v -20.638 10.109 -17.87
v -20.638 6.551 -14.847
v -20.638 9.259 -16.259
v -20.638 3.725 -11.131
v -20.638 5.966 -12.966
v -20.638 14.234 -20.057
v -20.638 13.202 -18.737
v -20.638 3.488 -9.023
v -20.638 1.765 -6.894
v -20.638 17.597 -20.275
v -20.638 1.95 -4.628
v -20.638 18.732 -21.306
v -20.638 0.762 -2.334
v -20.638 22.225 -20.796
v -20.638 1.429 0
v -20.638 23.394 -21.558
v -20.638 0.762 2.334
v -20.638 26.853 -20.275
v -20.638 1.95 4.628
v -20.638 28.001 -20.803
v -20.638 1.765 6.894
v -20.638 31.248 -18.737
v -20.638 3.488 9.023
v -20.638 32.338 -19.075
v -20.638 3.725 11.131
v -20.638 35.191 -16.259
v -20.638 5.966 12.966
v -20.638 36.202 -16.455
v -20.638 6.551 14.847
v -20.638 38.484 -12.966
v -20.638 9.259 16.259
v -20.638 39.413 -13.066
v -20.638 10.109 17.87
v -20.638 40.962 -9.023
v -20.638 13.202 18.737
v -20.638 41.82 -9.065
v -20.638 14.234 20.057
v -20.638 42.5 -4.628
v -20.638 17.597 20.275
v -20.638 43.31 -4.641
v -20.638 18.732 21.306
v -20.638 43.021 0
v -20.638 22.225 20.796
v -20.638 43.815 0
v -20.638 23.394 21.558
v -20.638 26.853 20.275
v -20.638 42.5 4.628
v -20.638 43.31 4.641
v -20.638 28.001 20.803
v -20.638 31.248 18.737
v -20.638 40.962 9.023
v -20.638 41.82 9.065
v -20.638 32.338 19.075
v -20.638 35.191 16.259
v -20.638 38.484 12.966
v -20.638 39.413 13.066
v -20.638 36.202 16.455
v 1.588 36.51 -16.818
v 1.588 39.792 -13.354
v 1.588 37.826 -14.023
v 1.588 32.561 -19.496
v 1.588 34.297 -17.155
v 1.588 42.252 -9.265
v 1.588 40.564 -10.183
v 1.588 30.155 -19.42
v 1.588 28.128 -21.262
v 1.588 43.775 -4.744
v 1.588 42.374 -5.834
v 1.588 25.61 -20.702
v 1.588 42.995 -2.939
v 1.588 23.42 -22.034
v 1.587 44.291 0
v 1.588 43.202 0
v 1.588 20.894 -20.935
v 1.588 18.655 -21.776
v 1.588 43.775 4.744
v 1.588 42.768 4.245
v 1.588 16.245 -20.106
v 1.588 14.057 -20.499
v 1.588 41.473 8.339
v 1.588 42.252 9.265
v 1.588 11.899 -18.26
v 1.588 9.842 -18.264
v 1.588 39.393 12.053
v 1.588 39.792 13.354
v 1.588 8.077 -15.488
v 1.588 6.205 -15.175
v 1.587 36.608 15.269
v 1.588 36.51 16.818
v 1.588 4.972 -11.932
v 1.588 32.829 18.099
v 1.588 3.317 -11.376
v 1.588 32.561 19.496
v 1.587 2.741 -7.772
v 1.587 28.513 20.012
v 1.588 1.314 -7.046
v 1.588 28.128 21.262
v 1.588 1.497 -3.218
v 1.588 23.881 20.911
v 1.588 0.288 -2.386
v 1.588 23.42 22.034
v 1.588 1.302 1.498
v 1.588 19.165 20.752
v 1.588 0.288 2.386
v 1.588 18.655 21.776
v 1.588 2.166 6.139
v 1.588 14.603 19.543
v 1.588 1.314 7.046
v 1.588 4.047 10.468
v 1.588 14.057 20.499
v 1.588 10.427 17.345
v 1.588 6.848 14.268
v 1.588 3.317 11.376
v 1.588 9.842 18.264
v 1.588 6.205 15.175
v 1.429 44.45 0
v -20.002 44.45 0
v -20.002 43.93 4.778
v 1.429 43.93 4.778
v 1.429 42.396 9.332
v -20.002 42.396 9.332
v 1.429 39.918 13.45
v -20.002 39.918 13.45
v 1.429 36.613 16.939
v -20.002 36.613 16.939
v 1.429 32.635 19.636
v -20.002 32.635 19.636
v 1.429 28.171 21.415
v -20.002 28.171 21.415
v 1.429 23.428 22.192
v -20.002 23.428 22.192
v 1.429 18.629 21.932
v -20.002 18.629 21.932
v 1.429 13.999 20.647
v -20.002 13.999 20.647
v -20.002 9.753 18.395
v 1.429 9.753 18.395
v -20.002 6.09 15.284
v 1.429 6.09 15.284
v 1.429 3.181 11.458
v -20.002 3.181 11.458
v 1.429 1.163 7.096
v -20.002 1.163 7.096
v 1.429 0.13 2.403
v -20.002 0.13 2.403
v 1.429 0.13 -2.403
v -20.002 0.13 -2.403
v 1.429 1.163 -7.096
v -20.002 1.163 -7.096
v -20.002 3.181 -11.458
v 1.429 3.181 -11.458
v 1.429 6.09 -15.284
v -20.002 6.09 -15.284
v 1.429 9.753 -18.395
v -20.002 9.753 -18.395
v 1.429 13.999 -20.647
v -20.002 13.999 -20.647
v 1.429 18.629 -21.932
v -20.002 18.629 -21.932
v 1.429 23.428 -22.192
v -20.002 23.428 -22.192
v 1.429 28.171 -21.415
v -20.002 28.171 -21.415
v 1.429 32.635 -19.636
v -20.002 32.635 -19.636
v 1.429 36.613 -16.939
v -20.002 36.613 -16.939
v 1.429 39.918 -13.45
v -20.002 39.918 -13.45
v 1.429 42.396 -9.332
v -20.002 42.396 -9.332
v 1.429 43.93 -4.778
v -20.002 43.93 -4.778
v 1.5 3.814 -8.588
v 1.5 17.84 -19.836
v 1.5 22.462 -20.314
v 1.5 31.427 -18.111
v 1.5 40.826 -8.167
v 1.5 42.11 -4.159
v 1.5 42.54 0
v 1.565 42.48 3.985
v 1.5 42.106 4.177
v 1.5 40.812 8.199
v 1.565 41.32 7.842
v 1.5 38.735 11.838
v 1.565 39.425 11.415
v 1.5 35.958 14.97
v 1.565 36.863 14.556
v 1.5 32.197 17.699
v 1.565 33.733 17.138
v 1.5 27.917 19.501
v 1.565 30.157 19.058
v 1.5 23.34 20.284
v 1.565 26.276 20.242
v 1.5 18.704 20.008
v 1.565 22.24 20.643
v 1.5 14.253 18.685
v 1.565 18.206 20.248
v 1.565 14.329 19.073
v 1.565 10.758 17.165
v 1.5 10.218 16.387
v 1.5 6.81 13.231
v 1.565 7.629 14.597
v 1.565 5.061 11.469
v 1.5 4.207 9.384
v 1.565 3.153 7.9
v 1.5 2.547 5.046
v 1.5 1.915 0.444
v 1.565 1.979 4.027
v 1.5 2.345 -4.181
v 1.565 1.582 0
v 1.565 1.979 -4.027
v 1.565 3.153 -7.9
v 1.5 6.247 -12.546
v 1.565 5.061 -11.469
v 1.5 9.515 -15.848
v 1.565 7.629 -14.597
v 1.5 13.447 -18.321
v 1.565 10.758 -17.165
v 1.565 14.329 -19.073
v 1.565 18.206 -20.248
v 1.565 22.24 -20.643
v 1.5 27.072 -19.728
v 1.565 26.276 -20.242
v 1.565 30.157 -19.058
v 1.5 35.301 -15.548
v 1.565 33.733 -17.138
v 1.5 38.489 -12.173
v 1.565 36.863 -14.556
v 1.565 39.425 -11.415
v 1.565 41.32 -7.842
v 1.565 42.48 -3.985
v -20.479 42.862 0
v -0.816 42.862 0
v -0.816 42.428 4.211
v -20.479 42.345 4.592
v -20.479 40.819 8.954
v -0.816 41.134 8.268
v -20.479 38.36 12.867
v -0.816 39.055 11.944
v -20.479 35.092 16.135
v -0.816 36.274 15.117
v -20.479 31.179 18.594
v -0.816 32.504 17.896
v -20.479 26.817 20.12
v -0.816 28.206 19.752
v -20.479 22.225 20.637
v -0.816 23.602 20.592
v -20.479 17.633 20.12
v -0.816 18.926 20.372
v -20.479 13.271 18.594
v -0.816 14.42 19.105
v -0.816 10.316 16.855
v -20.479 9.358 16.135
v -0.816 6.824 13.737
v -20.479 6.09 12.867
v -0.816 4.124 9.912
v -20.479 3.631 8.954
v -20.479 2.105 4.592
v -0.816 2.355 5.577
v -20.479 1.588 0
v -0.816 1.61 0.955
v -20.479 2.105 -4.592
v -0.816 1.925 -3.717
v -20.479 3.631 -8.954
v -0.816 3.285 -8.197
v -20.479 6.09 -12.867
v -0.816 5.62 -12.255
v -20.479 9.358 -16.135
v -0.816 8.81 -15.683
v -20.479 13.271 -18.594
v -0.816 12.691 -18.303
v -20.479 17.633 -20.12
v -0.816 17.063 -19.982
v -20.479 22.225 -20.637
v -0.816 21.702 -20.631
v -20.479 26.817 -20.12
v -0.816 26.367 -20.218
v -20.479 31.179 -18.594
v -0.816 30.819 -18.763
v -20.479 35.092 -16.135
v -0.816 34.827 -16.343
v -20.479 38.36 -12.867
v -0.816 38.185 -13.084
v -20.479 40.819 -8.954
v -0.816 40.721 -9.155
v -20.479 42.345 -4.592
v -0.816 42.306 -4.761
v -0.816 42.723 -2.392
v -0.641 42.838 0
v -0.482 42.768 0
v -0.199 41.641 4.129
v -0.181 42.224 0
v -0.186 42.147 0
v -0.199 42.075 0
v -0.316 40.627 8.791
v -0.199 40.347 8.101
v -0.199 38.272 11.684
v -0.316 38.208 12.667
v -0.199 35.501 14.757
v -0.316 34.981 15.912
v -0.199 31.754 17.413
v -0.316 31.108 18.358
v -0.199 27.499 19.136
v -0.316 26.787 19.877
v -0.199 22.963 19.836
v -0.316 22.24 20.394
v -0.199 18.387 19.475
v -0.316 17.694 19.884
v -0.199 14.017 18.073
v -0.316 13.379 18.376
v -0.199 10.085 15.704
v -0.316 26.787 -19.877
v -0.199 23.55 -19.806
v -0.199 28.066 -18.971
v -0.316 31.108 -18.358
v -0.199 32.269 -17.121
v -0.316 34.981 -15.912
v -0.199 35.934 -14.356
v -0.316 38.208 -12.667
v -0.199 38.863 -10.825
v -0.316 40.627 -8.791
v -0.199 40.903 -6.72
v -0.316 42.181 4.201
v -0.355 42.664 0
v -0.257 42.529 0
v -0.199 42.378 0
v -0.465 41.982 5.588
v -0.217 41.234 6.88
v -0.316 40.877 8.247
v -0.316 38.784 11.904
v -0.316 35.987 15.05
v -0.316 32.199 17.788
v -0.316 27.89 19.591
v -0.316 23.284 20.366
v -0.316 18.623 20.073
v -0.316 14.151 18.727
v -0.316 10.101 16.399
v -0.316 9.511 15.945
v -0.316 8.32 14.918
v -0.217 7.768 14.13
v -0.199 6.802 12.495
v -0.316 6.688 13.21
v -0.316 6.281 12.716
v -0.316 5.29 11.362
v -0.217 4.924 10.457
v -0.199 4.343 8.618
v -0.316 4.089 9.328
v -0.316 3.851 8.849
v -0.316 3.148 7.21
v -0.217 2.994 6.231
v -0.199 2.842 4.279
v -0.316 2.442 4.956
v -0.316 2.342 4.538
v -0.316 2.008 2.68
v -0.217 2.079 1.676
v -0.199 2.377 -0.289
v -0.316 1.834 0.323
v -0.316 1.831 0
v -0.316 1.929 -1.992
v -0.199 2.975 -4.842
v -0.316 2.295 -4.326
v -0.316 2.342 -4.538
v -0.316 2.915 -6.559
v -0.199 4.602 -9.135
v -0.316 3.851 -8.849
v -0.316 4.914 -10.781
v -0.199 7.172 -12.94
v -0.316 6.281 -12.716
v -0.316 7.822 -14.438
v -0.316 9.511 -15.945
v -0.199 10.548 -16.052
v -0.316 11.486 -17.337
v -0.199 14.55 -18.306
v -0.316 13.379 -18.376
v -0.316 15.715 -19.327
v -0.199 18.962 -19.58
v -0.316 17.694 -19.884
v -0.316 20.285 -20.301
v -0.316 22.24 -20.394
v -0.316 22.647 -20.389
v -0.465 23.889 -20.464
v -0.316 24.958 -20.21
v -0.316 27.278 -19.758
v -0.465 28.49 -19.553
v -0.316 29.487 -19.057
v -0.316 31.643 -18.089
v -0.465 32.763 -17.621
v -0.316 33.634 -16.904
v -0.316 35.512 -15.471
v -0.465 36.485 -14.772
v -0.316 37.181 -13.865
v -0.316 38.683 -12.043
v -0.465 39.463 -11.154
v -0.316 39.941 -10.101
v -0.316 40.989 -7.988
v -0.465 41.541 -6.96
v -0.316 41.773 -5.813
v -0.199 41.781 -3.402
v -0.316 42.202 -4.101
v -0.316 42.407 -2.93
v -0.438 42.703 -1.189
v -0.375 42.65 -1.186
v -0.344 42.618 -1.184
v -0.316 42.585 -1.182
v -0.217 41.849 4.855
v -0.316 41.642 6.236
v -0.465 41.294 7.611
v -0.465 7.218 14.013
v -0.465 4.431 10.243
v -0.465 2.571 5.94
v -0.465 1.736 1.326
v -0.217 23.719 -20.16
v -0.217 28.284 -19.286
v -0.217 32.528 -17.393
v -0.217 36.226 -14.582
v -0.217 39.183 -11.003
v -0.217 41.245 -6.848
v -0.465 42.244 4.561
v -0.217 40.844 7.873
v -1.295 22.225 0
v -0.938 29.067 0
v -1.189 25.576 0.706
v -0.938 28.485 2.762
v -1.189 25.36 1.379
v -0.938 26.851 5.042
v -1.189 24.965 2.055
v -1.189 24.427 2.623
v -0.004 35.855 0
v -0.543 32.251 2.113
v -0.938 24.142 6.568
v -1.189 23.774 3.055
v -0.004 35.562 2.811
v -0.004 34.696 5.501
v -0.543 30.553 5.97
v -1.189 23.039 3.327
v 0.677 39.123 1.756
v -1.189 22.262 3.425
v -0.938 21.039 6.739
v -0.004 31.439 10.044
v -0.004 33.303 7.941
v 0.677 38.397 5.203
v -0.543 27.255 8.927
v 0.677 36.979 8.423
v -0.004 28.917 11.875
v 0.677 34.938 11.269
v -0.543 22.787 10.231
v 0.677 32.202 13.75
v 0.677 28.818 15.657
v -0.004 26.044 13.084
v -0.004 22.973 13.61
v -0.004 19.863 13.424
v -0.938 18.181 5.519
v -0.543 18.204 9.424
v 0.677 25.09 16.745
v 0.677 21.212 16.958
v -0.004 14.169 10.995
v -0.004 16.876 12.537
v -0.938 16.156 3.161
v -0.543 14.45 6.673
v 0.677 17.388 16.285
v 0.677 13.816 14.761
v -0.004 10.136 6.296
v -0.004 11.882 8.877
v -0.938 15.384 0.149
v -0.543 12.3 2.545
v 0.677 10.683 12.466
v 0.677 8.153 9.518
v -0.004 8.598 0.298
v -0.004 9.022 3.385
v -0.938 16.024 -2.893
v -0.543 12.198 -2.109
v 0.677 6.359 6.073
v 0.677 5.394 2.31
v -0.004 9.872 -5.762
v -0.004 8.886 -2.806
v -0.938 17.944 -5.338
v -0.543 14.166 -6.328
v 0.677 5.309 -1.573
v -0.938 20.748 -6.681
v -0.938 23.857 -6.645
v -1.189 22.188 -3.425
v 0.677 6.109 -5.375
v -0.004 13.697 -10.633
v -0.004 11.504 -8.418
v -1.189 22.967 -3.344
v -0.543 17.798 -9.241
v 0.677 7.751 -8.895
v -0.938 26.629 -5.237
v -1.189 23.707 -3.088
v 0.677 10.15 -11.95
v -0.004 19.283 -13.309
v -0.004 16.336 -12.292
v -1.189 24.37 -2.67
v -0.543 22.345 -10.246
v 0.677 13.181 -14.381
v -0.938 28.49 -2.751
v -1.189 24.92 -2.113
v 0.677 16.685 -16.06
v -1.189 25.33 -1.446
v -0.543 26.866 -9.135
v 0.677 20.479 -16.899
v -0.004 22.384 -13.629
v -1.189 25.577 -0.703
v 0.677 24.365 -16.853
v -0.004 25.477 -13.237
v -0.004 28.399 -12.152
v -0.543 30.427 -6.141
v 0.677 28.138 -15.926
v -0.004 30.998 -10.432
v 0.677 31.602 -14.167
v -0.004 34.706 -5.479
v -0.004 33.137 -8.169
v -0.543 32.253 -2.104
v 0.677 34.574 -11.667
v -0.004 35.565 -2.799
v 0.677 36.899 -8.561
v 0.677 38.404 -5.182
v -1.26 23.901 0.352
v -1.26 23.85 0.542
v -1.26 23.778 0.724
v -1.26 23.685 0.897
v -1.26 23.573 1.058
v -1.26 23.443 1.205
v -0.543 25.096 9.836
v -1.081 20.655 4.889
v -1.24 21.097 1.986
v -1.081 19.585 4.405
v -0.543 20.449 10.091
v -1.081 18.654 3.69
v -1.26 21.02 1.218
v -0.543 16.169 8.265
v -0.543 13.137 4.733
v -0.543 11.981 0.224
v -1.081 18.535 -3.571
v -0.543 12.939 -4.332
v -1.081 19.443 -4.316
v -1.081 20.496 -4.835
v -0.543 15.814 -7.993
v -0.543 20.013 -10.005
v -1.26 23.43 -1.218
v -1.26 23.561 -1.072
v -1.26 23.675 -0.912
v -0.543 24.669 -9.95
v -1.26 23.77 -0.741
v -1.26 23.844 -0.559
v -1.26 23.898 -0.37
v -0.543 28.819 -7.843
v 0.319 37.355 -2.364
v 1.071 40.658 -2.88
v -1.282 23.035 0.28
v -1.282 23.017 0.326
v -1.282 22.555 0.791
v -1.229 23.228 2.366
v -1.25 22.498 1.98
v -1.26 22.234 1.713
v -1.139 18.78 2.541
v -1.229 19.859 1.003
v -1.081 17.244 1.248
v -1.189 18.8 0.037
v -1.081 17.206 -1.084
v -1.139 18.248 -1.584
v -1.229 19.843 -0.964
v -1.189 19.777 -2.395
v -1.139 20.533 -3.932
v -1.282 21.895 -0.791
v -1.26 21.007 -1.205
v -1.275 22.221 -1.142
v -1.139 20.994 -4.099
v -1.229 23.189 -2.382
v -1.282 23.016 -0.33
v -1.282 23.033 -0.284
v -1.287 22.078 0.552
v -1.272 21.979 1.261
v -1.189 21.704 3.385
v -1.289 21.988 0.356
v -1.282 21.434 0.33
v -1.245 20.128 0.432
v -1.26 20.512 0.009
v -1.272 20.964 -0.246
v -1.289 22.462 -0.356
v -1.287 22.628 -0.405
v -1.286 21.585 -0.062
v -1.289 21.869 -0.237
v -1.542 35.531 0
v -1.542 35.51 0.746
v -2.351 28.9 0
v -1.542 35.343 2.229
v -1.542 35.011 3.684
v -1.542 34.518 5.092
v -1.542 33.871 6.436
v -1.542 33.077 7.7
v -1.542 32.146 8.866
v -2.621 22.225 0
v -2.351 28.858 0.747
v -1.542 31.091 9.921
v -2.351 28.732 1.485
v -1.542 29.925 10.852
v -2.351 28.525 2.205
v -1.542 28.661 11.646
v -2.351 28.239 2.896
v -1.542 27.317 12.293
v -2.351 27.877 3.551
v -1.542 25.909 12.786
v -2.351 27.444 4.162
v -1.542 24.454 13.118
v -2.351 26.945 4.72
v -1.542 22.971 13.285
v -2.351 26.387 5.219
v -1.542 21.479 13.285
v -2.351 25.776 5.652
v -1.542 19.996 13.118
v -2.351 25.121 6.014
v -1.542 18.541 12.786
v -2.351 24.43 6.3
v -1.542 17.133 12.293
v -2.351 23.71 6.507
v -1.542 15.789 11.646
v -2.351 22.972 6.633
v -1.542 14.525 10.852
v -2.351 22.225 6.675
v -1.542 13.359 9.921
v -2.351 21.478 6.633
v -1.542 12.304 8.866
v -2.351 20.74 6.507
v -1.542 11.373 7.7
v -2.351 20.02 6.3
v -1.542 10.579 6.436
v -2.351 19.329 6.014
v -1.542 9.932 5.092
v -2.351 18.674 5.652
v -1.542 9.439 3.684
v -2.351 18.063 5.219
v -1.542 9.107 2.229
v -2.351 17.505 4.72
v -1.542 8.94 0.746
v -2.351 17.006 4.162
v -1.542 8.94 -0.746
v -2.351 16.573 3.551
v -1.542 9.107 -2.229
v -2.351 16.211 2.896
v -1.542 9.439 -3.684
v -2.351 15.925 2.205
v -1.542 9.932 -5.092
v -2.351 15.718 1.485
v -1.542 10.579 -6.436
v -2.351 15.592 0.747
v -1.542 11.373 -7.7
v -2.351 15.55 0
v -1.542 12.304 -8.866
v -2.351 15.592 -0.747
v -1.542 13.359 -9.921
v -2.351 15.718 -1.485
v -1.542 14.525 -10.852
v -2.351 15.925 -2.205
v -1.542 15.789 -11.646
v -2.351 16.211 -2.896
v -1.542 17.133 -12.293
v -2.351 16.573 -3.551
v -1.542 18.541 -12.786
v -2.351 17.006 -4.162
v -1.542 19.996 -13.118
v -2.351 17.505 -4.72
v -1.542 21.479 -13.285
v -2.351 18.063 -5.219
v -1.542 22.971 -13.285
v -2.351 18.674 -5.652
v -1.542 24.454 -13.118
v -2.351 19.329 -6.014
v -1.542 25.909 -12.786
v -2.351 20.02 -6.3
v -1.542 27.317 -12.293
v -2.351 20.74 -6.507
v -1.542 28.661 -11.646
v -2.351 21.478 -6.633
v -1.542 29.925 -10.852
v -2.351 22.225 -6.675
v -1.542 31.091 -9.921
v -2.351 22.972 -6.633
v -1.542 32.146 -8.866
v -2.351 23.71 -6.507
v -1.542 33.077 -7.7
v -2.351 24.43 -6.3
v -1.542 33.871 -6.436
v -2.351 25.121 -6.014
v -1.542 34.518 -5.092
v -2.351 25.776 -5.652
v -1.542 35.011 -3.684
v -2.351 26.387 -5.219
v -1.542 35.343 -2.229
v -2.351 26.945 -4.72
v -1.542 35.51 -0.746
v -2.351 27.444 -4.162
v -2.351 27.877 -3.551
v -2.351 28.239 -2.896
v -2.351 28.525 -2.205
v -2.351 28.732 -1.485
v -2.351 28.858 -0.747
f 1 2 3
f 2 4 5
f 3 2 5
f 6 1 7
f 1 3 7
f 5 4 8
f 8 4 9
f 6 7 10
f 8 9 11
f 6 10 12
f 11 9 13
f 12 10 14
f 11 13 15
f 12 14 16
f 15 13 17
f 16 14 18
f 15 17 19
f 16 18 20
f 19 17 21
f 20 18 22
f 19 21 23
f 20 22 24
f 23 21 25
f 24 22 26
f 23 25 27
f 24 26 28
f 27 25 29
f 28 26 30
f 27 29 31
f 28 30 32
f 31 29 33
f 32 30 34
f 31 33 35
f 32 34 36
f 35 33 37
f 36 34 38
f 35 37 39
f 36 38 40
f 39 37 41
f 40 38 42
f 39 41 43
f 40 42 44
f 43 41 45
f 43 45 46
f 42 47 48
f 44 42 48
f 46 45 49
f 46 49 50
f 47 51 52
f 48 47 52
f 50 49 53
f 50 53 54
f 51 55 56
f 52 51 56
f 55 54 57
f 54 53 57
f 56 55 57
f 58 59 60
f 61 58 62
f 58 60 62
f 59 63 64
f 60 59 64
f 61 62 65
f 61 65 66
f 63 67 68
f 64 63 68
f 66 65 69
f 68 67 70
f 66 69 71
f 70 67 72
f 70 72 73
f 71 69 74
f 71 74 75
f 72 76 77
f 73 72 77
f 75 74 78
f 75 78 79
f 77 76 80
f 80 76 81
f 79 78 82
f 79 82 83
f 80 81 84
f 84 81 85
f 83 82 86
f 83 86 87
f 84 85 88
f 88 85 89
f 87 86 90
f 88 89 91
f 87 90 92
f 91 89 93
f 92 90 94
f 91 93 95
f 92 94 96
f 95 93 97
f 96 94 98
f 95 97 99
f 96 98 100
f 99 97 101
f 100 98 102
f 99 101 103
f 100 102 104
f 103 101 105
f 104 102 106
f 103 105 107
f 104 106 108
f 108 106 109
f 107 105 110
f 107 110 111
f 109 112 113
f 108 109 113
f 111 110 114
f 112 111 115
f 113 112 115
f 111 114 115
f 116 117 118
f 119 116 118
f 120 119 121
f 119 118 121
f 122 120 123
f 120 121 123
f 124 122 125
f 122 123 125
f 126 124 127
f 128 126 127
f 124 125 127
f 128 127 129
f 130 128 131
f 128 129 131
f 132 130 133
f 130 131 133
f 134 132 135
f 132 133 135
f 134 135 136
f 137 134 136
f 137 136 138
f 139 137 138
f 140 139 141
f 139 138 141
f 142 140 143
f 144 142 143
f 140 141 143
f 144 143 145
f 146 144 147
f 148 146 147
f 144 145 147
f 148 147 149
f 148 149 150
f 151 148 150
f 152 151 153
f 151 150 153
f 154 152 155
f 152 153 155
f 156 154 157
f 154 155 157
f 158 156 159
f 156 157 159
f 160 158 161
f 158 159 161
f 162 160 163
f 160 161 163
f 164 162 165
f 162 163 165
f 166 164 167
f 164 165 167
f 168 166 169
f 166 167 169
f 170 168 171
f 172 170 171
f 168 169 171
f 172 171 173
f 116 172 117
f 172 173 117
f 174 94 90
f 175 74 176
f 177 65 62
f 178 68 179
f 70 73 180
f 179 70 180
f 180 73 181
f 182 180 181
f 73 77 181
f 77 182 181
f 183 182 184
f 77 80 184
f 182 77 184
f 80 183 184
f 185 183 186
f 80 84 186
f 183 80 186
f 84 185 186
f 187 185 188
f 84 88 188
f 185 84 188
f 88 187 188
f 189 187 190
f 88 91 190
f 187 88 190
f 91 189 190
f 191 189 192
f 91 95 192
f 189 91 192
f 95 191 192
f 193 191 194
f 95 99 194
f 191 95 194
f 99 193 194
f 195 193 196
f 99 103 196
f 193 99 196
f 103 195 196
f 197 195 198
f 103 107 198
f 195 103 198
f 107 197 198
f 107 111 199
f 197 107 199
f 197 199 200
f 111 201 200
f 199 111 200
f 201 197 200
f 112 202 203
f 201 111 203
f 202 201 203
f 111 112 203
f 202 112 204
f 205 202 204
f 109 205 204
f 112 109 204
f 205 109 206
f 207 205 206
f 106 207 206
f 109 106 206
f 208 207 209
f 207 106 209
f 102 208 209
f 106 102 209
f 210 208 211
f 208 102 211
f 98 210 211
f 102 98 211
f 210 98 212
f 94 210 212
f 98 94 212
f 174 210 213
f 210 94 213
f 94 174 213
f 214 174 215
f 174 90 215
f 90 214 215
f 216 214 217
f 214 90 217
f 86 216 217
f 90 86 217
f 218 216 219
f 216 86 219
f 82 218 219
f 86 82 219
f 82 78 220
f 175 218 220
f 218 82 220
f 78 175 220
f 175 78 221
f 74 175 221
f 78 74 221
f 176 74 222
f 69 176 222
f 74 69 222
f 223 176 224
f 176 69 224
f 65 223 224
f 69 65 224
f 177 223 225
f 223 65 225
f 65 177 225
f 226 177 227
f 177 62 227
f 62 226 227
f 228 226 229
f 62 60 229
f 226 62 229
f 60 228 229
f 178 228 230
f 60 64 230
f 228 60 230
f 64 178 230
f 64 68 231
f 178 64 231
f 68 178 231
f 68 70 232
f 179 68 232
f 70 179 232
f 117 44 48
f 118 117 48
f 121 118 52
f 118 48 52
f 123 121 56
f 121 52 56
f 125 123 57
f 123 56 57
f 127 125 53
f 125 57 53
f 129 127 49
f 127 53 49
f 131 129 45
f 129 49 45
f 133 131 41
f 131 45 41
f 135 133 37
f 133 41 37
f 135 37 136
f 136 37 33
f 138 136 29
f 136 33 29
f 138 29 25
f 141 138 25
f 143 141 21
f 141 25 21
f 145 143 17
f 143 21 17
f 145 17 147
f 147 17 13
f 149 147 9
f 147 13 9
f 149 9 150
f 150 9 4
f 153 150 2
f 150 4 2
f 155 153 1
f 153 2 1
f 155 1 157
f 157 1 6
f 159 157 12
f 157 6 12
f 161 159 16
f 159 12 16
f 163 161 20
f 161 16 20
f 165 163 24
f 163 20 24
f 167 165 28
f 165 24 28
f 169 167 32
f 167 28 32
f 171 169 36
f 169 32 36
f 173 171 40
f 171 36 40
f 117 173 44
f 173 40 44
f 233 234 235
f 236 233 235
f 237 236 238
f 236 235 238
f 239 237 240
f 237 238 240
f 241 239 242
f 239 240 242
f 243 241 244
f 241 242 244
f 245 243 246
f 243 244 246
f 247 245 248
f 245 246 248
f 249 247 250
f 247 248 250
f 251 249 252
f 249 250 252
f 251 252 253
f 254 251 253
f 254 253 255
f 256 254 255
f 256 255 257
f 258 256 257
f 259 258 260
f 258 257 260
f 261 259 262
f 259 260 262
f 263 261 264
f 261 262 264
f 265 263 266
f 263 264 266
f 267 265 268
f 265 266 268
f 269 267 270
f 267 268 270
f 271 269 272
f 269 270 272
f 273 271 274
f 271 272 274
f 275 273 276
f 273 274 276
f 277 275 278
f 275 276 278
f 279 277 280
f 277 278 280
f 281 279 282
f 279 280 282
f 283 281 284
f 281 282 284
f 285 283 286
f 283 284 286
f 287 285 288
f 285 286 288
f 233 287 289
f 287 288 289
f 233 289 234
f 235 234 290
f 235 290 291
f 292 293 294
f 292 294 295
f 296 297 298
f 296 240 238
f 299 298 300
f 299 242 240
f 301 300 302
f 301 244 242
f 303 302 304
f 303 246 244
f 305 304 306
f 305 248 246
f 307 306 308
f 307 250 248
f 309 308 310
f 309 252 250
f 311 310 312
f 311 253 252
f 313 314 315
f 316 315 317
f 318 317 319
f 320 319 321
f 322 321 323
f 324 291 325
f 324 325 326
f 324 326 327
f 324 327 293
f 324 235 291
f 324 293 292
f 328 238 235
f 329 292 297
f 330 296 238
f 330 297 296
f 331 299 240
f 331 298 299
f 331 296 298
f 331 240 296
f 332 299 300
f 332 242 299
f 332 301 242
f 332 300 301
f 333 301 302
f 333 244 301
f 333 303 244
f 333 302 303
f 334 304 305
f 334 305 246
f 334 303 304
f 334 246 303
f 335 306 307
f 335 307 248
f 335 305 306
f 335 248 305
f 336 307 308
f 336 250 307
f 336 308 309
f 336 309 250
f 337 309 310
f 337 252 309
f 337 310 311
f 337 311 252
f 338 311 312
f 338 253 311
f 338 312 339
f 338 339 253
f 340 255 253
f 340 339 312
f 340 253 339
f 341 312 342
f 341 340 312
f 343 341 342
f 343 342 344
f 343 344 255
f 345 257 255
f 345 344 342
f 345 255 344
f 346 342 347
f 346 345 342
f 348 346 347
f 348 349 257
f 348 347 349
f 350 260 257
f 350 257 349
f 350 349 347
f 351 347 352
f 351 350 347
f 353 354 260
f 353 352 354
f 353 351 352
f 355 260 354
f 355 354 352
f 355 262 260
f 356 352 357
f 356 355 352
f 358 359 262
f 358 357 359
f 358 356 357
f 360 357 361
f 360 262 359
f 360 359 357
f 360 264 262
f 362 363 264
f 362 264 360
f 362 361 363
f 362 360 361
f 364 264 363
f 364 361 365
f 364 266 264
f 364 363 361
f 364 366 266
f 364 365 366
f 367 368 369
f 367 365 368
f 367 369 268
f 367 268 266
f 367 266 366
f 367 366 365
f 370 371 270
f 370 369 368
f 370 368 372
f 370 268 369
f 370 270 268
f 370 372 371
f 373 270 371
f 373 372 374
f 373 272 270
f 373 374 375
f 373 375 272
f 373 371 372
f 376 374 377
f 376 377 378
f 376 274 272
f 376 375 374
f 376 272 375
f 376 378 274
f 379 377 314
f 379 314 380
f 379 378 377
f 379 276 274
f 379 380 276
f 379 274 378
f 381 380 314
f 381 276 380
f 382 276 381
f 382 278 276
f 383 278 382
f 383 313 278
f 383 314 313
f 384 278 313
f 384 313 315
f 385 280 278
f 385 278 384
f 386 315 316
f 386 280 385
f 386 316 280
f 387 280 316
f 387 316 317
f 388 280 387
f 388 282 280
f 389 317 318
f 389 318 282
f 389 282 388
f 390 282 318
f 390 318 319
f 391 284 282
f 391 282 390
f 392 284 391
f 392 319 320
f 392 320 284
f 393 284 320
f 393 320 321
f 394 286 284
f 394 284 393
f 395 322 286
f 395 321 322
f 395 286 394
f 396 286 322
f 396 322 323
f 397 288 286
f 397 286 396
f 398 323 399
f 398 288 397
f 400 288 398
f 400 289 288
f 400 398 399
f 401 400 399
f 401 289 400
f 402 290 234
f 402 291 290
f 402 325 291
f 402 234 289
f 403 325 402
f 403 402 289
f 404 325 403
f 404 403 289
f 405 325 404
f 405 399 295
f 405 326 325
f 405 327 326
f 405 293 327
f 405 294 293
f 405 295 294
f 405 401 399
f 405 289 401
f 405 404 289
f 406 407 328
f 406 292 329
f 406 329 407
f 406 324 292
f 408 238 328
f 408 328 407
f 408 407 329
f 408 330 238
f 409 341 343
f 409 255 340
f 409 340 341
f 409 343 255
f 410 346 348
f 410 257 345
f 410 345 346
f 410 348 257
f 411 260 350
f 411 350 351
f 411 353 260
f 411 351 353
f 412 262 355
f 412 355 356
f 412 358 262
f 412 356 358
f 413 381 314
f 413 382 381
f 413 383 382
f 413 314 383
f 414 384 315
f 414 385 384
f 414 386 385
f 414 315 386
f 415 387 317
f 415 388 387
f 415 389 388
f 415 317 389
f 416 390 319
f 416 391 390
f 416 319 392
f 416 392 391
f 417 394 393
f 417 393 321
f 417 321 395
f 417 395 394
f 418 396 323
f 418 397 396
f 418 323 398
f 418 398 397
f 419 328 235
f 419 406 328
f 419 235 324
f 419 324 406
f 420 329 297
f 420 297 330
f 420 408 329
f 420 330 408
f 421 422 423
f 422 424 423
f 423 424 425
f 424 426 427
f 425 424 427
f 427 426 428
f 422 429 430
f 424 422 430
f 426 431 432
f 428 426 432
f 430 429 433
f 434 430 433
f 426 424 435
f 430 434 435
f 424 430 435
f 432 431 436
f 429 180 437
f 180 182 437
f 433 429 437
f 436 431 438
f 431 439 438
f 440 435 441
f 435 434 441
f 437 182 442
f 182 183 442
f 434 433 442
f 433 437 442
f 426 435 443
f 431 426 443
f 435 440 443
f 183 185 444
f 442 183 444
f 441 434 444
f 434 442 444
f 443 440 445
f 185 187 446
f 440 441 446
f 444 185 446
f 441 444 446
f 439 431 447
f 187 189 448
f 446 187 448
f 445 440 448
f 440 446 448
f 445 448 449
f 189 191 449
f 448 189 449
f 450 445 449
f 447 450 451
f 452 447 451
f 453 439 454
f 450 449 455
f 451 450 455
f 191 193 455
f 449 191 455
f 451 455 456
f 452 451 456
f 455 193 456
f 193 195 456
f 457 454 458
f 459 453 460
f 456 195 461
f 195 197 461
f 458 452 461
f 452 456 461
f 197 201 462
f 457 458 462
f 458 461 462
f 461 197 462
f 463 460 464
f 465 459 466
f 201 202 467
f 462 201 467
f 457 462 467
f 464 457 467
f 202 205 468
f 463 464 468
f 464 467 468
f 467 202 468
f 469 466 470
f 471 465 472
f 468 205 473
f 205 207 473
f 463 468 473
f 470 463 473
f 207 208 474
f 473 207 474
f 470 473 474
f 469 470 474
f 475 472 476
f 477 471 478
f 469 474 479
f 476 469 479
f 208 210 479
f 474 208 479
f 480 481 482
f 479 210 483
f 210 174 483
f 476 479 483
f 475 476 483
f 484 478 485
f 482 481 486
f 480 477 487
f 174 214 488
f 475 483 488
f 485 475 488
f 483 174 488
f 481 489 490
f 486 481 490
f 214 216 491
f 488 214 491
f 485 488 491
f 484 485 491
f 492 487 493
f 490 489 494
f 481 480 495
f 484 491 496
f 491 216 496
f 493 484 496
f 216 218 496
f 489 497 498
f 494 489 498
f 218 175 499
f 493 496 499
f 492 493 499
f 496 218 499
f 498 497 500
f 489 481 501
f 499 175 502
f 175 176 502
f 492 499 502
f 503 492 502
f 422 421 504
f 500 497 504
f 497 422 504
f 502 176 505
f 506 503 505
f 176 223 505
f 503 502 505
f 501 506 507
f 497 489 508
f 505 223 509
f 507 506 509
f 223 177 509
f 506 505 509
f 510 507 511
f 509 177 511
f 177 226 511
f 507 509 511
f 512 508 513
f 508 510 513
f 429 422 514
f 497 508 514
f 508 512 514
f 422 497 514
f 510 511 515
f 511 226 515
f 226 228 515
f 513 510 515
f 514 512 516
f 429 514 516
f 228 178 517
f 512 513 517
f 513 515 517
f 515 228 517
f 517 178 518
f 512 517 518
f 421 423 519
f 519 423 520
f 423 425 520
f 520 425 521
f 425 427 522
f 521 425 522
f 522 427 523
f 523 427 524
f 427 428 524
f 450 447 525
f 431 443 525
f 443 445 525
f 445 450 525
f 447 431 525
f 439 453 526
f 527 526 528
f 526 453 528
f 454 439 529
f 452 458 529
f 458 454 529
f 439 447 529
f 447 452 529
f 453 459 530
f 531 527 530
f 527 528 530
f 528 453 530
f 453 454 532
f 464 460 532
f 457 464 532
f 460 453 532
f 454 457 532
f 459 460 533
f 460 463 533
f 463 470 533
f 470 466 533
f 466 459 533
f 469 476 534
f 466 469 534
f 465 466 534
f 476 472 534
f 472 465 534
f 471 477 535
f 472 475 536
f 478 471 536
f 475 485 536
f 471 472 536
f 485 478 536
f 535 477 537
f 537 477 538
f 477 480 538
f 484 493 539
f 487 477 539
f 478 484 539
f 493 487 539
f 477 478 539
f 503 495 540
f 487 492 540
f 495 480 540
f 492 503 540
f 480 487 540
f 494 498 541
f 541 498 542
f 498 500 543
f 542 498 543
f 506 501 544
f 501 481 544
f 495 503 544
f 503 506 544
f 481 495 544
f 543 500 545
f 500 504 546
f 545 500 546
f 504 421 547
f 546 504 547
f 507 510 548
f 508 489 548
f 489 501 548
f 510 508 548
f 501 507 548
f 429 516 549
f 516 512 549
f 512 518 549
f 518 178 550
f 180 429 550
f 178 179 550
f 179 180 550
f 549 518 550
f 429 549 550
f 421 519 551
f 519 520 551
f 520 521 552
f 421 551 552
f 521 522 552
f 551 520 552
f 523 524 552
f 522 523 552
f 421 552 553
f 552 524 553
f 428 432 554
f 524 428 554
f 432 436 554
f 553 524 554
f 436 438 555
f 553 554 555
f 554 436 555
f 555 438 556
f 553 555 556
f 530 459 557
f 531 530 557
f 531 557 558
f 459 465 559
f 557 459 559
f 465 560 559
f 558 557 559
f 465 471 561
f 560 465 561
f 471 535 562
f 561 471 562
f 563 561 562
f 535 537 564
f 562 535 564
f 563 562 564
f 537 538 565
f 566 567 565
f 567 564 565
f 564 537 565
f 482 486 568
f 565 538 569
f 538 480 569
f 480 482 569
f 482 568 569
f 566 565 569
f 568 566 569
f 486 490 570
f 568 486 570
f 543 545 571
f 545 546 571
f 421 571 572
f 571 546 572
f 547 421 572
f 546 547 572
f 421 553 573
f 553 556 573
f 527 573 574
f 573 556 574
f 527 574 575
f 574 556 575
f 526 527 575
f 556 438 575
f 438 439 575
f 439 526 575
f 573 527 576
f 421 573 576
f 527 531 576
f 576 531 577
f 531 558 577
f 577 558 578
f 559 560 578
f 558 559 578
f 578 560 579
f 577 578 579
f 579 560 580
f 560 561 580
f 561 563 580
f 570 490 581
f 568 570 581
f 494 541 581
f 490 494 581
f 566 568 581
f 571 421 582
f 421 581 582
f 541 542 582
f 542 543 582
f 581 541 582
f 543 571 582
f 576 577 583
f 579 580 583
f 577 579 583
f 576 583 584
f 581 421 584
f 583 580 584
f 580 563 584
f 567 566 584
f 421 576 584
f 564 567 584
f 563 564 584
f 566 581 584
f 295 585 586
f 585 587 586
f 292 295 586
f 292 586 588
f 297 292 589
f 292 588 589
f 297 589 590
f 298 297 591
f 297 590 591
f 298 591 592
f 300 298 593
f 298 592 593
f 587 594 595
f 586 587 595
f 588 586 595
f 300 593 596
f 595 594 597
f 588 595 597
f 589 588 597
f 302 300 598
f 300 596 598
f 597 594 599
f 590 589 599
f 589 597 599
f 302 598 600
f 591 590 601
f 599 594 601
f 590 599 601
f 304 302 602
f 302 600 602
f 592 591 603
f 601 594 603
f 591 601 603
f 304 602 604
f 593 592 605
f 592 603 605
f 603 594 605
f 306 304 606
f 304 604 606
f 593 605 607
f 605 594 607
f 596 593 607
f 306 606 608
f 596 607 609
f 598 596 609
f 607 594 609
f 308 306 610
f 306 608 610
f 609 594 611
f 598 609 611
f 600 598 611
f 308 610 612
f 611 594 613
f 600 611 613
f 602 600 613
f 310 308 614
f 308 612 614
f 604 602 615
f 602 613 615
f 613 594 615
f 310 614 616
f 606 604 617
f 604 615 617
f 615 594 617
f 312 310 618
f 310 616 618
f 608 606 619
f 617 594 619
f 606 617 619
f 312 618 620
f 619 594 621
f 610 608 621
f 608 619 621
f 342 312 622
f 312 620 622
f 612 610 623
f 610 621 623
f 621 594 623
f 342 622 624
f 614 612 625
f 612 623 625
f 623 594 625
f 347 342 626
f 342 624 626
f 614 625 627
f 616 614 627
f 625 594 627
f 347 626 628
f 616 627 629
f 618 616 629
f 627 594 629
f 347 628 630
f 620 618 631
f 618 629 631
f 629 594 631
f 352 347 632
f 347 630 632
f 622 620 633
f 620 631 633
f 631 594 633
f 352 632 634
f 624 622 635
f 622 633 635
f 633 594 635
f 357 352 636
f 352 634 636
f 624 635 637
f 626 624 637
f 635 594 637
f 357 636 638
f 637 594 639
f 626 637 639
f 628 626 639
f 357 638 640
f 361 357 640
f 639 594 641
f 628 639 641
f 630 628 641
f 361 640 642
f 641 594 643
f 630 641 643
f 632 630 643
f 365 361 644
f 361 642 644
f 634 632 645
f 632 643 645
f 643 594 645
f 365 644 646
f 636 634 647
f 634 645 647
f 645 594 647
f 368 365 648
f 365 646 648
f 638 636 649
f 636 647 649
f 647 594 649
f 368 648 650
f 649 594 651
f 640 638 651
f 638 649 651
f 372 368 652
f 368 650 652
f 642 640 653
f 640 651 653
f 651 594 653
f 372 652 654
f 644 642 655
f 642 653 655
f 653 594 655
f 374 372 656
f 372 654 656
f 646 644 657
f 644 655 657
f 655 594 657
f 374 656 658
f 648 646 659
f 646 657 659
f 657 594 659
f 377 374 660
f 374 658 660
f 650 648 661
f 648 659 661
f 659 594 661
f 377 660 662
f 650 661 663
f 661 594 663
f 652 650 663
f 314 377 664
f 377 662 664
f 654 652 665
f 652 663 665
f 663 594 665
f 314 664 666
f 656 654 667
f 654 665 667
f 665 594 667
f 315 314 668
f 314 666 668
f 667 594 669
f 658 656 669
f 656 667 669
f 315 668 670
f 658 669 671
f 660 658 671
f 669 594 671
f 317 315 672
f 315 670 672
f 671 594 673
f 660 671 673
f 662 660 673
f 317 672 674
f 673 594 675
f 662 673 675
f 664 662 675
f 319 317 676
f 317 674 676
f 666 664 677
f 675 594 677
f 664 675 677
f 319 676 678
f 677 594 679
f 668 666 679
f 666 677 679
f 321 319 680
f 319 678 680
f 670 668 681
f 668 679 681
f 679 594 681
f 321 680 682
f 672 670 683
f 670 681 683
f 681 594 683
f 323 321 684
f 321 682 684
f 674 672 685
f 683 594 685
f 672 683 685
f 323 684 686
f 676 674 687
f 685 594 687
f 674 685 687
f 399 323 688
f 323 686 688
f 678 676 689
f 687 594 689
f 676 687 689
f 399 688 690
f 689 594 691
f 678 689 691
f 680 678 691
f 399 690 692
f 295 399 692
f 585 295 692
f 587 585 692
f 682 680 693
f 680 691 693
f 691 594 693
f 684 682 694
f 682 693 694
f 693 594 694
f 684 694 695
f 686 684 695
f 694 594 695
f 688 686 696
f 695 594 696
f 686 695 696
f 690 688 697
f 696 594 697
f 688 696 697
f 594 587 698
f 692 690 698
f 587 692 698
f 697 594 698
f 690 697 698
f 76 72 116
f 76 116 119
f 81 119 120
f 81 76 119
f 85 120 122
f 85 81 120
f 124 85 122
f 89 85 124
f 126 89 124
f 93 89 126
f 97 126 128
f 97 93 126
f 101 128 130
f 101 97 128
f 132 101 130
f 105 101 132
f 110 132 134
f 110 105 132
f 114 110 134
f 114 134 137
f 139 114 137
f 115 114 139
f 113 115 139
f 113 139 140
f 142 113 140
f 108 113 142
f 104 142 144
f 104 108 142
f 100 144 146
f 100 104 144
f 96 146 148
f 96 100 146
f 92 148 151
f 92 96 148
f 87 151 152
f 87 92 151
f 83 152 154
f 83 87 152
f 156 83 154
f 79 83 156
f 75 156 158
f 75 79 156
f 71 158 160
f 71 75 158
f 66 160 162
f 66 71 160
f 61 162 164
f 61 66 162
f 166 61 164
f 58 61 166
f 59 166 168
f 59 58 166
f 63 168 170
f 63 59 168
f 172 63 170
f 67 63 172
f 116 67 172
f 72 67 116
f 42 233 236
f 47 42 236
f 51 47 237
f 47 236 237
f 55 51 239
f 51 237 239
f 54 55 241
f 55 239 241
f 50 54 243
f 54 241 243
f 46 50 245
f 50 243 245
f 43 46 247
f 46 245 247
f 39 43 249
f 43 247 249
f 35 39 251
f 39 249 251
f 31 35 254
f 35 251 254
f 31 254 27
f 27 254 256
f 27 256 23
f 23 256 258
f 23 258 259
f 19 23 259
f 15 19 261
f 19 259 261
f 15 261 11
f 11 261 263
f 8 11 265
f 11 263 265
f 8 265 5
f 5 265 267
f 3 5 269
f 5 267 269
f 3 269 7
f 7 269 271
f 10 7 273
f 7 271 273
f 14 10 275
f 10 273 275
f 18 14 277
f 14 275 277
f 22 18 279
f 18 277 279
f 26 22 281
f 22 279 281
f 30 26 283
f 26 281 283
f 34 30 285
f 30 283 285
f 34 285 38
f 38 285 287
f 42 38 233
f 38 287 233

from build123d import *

# Parameters (mm, degrees)
CHAMFER2_SIZE = 0.635
CHAMFER3_SIZE = 0.15875
FILLET1_R     = 2.54
FILLET2_R     = 0.635


with BuildPart() as part:
    # Sketch1 → Revolve1 (revolve)
    with BuildSketch(Plane.XY):
        with BuildLine():
            Line((-2.621306193, 22.225), (-1.294558461, 22.225))
            ThreePointArc((-1.294558461, 22.225), (-0.519789241, 32.63679423), (1.5875, 42.8625))
            Line((1.5875, 42.8625), (1.5875, 44.45))
            Line((1.5875, 44.45), (-20.6375, 44.45))
            Line((-20.6375, 44.45), (-20.6375, 42.8625))
            Line((-20.6375, 42.8625), (0, 42.8625))
            ThreePointArc((0, 42.8625), (-1.963357619, 32.626654344), (-2.621306193, 22.225))
        make_face()
    revolve(axis=Axis((-2.621306193, 22.225, 0), (1, 0, 0)))

    # Chamfer2
    chamfer2_edges = [part.edges().sort_by_distance(p)[0] for p in [
        (-20.6375, 0, 0),
    ]]
    chamfer(chamfer2_edges, length=CHAMFER2_SIZE)

    # Chamfer3
    chamfer3_edges = [part.edges().sort_by_distance(p)[0] for p in [
        (1.5875, 0, 0),
        (-20.6375, 1.5875, 0),
    ]]
    chamfer(chamfer3_edges, length=CHAMFER3_SIZE)

    # Fillet1
    fillet1_edges = [part.edges().sort_by_distance(p)[0] for p in [
        (1.5875, 1.5875, 0),
    ]]
    fillet(fillet1_edges, radius=FILLET1_R)

    # Fillet2
    fillet2_edges = [part.edges().sort_by_distance(p)[0] for p in [
        (0, 1.5875, 0),
    ]]
    fillet(fillet2_edges, radius=FILLET2_R)


solid = part.part
